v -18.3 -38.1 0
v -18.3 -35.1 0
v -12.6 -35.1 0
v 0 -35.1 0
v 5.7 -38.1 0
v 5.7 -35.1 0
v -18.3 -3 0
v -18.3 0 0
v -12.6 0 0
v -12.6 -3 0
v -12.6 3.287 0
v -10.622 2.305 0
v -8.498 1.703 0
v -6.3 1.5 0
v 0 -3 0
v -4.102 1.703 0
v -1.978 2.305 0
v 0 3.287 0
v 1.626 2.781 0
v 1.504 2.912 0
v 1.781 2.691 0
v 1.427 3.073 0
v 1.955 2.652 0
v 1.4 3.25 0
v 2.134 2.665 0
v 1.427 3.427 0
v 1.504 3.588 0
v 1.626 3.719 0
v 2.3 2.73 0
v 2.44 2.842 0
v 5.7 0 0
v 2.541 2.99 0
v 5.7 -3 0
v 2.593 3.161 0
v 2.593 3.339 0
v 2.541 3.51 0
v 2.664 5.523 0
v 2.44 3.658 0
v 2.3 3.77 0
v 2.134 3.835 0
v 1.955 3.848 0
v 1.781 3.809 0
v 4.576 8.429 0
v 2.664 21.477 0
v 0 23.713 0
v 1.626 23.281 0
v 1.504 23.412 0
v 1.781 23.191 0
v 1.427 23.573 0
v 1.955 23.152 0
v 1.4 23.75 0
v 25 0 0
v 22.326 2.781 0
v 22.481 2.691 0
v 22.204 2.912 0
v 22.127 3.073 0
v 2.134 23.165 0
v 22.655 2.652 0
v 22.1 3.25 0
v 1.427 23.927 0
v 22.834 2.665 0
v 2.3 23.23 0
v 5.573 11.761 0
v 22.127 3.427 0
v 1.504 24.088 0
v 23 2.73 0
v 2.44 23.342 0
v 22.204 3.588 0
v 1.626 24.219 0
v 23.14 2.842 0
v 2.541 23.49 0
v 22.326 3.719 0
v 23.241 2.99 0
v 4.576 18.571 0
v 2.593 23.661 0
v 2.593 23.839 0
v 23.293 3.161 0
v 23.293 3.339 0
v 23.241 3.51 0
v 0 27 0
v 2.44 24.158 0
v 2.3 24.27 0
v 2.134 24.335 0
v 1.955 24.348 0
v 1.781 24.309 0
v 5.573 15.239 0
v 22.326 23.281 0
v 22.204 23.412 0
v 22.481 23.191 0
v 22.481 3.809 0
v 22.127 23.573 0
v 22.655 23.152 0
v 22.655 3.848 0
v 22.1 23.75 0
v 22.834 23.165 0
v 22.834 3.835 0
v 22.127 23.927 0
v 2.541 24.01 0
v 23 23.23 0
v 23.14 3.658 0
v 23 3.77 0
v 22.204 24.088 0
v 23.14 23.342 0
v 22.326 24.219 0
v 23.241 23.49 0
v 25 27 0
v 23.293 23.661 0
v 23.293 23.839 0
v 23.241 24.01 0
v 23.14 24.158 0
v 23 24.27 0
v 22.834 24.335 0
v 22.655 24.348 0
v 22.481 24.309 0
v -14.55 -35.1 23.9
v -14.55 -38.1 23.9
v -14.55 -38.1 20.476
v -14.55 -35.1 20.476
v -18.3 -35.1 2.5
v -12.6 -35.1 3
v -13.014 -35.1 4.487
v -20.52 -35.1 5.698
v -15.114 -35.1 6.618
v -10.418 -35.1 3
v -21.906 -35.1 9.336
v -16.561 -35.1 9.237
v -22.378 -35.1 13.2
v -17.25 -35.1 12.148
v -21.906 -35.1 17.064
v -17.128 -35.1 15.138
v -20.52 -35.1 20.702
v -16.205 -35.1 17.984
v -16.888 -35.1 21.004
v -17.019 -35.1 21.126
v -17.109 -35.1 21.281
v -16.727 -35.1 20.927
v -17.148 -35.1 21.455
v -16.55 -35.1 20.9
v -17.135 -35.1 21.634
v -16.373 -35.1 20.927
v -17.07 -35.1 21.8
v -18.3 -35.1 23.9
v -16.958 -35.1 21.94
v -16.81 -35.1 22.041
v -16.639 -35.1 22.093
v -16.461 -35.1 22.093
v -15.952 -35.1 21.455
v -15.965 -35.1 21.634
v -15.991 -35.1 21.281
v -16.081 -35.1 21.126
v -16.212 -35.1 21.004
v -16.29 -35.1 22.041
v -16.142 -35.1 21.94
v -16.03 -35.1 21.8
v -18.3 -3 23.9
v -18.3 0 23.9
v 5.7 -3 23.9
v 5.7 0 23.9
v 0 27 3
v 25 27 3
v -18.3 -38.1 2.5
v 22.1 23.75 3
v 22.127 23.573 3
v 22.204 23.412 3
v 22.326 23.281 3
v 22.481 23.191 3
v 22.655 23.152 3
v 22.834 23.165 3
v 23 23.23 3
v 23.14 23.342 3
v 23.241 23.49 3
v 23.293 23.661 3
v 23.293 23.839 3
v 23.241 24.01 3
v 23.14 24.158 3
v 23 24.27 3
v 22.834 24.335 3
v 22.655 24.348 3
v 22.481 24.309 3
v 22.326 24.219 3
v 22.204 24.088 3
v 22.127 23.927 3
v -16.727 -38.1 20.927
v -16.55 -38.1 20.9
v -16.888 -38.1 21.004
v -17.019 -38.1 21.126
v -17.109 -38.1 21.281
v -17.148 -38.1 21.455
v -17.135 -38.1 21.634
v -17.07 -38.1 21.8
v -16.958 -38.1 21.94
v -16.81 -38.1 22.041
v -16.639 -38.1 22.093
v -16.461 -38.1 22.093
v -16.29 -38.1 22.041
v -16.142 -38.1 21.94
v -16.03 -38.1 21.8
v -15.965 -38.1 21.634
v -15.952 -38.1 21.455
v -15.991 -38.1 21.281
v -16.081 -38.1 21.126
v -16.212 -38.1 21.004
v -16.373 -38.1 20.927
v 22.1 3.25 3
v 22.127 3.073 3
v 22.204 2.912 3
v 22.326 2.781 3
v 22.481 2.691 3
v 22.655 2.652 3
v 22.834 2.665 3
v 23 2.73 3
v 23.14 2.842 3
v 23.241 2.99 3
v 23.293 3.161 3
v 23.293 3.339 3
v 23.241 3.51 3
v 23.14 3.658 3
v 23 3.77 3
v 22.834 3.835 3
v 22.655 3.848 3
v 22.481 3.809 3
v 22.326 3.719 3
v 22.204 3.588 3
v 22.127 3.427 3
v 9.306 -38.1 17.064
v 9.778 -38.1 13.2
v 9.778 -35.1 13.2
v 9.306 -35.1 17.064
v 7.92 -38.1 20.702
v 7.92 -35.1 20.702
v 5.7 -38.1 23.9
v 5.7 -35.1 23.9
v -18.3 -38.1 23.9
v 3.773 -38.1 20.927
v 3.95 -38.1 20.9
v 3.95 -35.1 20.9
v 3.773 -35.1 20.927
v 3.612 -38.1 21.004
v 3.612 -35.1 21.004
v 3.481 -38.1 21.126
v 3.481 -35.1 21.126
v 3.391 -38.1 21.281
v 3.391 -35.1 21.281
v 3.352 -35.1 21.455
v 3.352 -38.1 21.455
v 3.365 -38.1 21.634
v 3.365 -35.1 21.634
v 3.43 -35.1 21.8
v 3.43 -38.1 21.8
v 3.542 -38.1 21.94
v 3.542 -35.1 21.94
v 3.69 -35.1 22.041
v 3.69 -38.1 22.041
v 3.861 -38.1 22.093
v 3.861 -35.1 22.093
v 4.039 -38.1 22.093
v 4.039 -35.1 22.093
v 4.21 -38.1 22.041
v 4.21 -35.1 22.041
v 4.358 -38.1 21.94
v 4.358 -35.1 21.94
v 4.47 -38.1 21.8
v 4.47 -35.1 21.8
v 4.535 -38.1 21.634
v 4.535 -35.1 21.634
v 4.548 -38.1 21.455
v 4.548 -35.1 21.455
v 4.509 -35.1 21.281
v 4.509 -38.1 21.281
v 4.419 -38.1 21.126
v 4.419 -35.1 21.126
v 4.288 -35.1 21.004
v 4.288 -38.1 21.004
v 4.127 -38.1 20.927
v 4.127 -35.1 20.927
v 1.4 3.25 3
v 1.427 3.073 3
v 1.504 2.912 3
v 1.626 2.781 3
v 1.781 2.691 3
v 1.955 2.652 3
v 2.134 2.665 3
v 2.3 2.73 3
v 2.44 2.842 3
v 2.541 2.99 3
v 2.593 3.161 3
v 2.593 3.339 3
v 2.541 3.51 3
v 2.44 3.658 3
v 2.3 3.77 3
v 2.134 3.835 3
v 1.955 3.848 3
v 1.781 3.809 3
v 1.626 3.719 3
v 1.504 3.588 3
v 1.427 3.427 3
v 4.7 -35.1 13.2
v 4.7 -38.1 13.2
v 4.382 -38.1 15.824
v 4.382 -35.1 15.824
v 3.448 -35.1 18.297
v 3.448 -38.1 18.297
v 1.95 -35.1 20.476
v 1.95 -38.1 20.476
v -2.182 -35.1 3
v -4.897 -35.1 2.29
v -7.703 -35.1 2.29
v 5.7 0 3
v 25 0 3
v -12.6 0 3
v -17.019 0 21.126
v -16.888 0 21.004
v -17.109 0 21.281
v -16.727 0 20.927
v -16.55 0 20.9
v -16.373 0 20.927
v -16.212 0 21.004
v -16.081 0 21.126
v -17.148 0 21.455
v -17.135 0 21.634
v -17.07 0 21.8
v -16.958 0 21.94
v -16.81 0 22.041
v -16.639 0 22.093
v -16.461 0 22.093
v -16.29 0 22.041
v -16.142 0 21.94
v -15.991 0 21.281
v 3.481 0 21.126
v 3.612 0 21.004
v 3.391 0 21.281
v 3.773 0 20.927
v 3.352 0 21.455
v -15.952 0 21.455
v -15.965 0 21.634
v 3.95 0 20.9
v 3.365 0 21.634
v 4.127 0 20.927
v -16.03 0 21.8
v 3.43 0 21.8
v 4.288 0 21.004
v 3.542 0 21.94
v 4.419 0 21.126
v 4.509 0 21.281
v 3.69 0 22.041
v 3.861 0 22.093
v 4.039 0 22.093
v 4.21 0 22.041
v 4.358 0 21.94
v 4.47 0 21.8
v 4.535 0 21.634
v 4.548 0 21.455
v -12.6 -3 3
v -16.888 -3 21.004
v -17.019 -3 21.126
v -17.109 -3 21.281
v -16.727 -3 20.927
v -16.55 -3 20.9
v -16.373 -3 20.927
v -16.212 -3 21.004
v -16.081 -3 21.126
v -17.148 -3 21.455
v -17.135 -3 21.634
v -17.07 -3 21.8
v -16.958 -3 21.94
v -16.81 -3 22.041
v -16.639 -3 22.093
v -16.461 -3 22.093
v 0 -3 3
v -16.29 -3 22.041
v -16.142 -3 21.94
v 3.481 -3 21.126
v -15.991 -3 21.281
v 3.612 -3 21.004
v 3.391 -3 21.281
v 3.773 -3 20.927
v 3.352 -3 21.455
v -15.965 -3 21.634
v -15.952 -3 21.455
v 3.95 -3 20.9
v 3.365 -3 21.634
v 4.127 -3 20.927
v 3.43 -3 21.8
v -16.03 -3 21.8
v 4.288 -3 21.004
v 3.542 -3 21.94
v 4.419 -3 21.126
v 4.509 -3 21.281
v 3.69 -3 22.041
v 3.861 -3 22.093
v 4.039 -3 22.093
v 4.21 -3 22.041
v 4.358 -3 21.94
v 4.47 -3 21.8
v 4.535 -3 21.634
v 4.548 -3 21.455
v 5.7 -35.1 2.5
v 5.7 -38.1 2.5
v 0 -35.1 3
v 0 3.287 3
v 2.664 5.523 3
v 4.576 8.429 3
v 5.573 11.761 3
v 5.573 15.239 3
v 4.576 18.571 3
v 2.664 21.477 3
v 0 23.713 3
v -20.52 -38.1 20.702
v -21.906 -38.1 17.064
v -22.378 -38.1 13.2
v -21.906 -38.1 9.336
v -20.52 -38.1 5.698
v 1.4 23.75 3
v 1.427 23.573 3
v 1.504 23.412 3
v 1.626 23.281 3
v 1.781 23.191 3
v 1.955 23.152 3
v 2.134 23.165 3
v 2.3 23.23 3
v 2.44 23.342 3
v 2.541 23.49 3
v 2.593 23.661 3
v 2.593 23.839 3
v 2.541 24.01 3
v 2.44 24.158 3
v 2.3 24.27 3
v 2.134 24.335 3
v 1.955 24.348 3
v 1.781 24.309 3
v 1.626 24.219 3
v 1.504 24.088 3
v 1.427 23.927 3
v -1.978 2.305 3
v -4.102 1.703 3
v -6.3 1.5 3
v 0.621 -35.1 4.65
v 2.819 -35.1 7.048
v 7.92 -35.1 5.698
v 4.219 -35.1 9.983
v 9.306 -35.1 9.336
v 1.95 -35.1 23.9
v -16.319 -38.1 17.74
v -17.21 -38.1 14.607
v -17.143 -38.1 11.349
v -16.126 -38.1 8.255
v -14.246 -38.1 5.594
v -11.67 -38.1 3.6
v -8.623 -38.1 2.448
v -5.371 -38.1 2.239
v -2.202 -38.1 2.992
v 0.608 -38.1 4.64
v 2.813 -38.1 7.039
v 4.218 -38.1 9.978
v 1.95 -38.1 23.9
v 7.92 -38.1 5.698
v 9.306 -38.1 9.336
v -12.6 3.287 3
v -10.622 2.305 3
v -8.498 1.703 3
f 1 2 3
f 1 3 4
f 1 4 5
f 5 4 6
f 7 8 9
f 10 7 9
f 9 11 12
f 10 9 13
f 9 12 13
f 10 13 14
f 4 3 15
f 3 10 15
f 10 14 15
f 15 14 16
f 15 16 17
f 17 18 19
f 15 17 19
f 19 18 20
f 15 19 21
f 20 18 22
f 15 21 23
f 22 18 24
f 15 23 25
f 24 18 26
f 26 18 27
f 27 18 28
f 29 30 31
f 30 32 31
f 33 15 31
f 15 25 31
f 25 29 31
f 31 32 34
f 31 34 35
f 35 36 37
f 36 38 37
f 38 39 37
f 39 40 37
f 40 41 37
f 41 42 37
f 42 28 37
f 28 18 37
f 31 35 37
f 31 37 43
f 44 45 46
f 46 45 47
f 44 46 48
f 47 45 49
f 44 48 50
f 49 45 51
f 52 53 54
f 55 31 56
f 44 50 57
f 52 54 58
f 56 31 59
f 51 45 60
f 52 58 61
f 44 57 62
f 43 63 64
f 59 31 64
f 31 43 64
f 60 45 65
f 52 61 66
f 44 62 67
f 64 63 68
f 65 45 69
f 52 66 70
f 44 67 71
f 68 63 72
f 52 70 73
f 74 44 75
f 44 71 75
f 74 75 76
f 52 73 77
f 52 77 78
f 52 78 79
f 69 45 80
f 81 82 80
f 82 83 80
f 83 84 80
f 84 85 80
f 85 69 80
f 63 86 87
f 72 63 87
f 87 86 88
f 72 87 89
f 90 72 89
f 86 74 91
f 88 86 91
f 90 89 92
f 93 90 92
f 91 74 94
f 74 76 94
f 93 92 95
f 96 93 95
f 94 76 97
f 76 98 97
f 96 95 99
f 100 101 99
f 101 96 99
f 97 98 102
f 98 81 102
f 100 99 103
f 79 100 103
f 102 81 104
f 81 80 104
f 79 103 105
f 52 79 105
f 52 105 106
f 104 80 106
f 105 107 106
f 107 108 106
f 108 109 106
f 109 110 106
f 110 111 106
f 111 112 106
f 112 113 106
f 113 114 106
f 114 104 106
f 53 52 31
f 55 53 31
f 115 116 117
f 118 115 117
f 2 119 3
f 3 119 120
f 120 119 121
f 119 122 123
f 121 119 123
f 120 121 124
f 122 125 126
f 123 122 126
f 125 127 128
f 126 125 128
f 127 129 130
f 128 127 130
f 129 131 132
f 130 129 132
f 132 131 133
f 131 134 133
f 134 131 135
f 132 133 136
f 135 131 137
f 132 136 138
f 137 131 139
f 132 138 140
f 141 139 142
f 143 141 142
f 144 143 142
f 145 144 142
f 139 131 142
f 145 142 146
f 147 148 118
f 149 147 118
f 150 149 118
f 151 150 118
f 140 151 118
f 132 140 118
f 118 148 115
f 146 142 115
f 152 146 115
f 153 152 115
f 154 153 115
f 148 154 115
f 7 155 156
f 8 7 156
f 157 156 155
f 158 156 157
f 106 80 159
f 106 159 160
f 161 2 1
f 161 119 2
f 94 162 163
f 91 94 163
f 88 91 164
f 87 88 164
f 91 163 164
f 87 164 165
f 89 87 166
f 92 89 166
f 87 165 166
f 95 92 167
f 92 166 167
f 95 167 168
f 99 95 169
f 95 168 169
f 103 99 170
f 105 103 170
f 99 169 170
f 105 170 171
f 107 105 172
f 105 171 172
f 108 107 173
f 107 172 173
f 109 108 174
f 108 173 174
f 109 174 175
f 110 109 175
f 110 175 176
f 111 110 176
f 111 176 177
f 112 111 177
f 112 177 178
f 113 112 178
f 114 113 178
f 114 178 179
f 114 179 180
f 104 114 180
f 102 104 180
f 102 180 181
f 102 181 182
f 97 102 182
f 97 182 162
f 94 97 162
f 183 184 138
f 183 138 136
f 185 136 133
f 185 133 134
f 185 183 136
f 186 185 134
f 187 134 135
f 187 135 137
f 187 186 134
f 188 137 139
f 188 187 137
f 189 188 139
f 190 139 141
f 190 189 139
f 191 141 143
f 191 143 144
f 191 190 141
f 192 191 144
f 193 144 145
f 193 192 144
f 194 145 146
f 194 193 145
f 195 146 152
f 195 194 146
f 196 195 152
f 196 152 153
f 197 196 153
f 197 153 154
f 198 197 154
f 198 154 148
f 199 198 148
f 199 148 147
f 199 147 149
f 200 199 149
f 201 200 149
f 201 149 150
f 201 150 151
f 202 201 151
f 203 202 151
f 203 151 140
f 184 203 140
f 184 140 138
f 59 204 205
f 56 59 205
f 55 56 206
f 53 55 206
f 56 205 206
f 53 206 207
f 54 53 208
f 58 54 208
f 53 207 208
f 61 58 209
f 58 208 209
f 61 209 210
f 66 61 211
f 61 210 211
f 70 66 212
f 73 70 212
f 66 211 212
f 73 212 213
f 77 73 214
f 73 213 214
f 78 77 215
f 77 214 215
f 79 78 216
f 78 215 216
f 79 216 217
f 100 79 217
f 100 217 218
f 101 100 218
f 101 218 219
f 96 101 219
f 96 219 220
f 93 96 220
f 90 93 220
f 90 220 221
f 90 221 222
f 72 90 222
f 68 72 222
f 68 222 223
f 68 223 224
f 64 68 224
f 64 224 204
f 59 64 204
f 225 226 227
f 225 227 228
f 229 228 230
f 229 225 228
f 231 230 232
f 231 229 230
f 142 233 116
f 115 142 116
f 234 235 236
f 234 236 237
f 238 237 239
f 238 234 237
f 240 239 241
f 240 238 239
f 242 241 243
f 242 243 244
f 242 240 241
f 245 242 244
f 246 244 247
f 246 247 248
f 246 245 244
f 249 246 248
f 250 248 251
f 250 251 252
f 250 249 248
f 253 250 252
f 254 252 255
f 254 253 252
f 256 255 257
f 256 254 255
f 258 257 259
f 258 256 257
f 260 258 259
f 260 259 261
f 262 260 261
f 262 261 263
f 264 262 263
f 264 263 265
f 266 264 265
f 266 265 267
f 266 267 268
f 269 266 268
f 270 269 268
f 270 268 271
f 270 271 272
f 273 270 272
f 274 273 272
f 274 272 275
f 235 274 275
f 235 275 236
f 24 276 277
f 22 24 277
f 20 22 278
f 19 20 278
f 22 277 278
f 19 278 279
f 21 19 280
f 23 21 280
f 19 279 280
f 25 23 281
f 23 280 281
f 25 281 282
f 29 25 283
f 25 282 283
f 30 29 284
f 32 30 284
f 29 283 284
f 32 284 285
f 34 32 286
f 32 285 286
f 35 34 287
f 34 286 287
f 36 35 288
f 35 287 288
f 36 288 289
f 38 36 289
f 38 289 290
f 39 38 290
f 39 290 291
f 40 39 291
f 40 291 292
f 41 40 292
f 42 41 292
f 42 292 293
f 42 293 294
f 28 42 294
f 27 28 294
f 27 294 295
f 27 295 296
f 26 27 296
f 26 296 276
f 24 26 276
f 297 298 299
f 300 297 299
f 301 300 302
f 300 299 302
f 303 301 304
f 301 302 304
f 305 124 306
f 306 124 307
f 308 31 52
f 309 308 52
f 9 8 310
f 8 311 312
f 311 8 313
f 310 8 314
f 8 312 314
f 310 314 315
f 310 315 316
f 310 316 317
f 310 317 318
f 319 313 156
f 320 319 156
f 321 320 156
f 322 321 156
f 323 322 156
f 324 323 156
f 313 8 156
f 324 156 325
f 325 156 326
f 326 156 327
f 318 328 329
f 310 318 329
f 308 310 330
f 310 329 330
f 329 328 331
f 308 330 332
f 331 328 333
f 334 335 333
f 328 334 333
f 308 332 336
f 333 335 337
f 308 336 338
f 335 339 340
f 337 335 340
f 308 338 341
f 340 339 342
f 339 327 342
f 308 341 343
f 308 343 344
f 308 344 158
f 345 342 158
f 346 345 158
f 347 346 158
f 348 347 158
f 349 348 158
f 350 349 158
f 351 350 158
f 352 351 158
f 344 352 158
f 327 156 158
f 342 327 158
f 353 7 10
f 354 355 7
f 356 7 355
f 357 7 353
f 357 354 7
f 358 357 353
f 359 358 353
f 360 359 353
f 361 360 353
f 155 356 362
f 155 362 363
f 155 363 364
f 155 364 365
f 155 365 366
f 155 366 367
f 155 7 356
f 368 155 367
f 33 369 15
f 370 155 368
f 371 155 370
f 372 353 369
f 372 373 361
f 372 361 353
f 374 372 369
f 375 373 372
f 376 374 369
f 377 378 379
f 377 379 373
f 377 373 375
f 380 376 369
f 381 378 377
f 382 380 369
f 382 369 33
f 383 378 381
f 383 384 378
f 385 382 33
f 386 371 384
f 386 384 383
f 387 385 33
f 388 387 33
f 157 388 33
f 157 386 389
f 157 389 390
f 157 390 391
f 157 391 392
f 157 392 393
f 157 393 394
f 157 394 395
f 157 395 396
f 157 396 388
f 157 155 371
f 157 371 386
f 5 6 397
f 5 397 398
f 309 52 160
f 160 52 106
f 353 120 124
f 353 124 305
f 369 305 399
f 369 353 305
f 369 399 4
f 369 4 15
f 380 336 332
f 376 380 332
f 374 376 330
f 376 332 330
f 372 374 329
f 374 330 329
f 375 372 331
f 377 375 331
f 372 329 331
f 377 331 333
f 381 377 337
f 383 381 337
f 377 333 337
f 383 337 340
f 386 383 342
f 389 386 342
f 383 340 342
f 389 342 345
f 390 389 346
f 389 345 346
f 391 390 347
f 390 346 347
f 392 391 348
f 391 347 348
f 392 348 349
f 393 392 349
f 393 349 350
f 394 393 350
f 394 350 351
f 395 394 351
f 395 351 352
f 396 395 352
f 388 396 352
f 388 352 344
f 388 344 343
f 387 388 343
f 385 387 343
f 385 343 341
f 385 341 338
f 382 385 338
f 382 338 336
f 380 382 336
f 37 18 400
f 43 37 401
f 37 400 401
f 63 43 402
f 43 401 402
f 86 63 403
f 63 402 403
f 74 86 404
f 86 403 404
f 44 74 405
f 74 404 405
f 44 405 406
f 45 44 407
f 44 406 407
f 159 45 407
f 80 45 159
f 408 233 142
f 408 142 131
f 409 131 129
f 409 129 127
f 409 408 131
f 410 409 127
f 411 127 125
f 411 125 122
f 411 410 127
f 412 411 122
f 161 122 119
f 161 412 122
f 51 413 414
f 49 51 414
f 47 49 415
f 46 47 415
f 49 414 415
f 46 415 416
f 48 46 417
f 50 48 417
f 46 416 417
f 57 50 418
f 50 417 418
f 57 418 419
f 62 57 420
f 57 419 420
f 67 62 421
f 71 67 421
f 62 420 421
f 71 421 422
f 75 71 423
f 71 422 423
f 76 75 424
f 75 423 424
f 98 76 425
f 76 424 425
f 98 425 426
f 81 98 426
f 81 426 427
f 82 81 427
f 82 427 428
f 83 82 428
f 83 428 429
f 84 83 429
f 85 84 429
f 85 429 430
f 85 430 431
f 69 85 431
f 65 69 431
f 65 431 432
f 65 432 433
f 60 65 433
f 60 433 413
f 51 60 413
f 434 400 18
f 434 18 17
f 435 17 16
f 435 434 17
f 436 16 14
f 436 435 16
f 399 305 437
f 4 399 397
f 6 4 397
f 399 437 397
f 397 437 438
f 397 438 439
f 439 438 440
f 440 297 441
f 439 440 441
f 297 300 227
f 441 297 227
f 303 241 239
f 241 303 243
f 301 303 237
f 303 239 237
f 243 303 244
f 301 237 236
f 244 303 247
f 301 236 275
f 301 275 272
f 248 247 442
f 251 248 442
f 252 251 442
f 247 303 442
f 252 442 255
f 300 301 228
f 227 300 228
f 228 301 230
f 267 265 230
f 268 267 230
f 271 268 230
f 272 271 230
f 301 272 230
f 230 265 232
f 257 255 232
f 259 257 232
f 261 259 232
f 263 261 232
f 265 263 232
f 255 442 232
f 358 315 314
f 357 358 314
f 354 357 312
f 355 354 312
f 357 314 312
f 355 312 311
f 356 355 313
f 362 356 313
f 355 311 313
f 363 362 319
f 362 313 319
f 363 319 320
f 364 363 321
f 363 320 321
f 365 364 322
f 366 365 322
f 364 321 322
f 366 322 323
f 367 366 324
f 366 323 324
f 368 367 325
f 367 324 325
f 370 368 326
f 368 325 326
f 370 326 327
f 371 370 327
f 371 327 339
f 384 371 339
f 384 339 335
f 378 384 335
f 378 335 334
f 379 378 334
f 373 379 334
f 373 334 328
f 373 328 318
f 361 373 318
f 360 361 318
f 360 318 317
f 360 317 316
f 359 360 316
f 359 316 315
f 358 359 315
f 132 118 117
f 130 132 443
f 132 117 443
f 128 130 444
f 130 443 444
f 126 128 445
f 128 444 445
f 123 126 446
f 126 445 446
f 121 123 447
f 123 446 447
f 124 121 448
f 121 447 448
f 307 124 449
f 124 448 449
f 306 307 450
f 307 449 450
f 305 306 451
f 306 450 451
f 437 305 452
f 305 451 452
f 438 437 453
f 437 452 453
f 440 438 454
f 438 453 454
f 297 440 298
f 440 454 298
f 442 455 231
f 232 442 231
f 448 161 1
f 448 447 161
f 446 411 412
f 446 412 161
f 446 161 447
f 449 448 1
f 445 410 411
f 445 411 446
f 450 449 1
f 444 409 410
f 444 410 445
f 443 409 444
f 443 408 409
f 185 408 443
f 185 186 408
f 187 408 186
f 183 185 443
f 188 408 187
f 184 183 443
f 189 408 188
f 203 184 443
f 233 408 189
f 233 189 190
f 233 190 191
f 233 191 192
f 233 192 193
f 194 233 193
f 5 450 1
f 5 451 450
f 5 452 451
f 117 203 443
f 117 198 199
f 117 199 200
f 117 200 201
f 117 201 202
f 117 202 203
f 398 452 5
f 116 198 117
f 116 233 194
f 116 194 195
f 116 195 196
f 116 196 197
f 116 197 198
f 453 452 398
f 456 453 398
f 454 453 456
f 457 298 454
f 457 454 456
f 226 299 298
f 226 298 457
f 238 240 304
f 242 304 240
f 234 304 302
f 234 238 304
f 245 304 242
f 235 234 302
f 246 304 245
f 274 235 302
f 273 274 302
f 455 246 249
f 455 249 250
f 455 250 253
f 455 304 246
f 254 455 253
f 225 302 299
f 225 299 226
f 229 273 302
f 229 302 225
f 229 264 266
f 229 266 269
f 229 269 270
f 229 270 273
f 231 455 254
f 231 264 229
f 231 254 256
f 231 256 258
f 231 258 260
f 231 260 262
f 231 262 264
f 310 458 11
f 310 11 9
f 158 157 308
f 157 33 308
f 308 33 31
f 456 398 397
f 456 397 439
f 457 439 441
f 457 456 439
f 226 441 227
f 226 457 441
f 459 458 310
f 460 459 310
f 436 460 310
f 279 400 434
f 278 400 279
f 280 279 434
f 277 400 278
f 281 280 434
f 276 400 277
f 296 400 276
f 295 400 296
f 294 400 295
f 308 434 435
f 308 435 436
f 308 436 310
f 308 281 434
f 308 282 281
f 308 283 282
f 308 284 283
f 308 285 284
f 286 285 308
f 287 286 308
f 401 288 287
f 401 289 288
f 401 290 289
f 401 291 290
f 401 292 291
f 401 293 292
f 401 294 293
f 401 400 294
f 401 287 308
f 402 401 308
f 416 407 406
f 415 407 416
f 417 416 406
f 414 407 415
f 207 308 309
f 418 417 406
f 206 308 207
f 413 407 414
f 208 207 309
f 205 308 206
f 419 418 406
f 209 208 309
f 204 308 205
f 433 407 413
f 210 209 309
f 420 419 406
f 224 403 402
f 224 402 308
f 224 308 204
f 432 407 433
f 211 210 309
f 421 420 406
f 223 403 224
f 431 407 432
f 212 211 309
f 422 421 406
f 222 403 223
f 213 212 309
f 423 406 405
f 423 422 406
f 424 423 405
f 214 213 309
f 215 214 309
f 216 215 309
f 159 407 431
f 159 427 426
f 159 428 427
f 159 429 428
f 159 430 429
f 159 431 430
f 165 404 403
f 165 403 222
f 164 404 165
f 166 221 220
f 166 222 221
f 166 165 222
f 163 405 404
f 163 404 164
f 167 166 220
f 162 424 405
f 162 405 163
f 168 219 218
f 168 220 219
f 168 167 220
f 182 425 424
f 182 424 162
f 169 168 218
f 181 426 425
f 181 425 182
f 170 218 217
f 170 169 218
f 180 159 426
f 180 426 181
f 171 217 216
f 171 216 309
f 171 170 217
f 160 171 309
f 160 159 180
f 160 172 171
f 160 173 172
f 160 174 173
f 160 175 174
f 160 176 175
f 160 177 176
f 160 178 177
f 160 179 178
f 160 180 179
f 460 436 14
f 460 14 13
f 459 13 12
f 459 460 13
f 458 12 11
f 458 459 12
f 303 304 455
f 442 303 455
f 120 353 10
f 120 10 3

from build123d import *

# Parameters (mm, degrees)
SKETCH_1_W                      = 25
SKETCH_1_H                      = 27
EXTRUDE_1_DEPTH                 = 3
CUT_EXTRUDE_1_REACH             = 38.919
SKETCH_2_R                      = 0.6
SKETCH_2_R_2                    = 12
CUT_EXTRUDE_1_DIRECTION_2_DEPTH = 37.918829884
EXTRUDE_2_DEPTH                 = 3
SKETCH_4_W                      = 24
SKETCH_4_H                      = 3
EXTRUDE_3_DEPTH                 = 20.9
EXTRUDE_3_DIRECTION_2_REACH     = 47.668
CUT_EXTRUDE_2_REACH             = 53.457
SKETCH_5_R                      = 0.6
CUT_EXTRUDE_2_DIRECTION_2_DEPTH = 52.456972317
CUT_EXTRUDE_4_DEPTH             = 3
EXTRUDE_4_DEPTH                 = 3


with BuildPart() as part:
    # 草图1 → 凸台-拉伸1 (new body)
    with BuildSketch(Plane.XY):
        with Locations((12.5, 13.5)):
            Rectangle(SKETCH_1_W, SKETCH_1_H)
    extrude(amount=EXTRUDE_1_DEPTH)

    # 草图2 → 切除-拉伸1 (cut, up to next)
    with BuildSketch(Plane.XY.offset(3), mode=Mode.PRIVATE) as cut_extrude_1_sk1:
        with Locations(Location((2, 23.75, 0), (0, 0, 180))):
            Circle(SKETCH_2_R)
    cut_extrude_1_tool1 = extrude(cut_extrude_1_sk1.sketch, amount=-CUT_EXTRUDE_1_REACH, mode=Mode.PRIVATE) & part.part
    # 草图2 → 切除-拉伸1 (cut, up to next)
    with BuildSketch(Plane.XY.offset(3), mode=Mode.PRIVATE) as cut_extrude_1_sk2:
        with Locations(Location((22.7, 23.75, 0), (0, 0, 180))):
            Circle(SKETCH_2_R)
    cut_extrude_1_tool2 = extrude(cut_extrude_1_sk2.sketch, amount=-CUT_EXTRUDE_1_REACH, mode=Mode.PRIVATE) & part.part
    # 草图2 → 切除-拉伸1 (cut, up to next)
    with BuildSketch(Plane.XY.offset(3), mode=Mode.PRIVATE) as cut_extrude_1_sk3:
        with Locations(Location((22.7, 3.25, 0), (0, 0, 180))):
            Circle(SKETCH_2_R)
    cut_extrude_1_tool3 = extrude(cut_extrude_1_sk3.sketch, amount=-CUT_EXTRUDE_1_REACH, mode=Mode.PRIVATE) & part.part
    # 草图2 → 切除-拉伸1 (cut, up to next)
    with BuildSketch(Plane.XY.offset(3), mode=Mode.PRIVATE) as cut_extrude_1_sk4:
        with Locations(Location((2, 3.25, 0), (0, 0, 180))):
            Circle(SKETCH_2_R)
    cut_extrude_1_tool4 = extrude(cut_extrude_1_sk4.sketch, amount=-CUT_EXTRUDE_1_REACH, mode=Mode.PRIVATE) & part.part
    # 草图2 → 切除-拉伸1 (cut, up to next)
    with BuildSketch(Plane.XY.offset(3), mode=Mode.PRIVATE) as cut_extrude_1_sk5:
        with Locations((-6.3, 13.5)):
            Circle(SKETCH_2_R_2)
    cut_extrude_1_tool5 = extrude(cut_extrude_1_sk5.sketch, amount=-CUT_EXTRUDE_1_REACH, mode=Mode.PRIVATE) & part.part
    add(cut_extrude_1_tool1.solids().sort_by_distance((2, 23.75, 3))[0], mode=Mode.SUBTRACT)
    add(cut_extrude_1_tool2.solids().sort_by_distance((22.7, 23.75, 3))[0], mode=Mode.SUBTRACT)
    add(cut_extrude_1_tool3.solids().sort_by_distance((22.7, 3.25, 3))[0], mode=Mode.SUBTRACT)
    add(cut_extrude_1_tool4.solids().sort_by_distance((2, 3.25, 3))[0], mode=Mode.SUBTRACT)
    add(cut_extrude_1_tool5.solids().sort_by_distance((-6.3, 13.5, 3))[0], mode=Mode.SUBTRACT)

    # 草图2 → 切除-拉伸1 direction 2 (cut)
    with BuildSketch(Plane.XY.offset(3)):
        with Locations(Location((2, 23.75, 0), (0, 0, 180))):
            Circle(SKETCH_2_R)
        with Locations(Location((22.7, 23.75, 0), (0, 0, 180))):
            Circle(SKETCH_2_R)
        with Locations(Location((22.7, 3.25, 0), (0, 0, 180))):
            Circle(SKETCH_2_R)
        with Locations(Location((2, 3.25, 0), (0, 0, 180))):
            Circle(SKETCH_2_R)
        with Locations((-6.3, 13.5)):
            Circle(SKETCH_2_R_2)
    extrude(amount=CUT_EXTRUDE_1_DIRECTION_2_DEPTH, mode=Mode.SUBTRACT)

    # 草图3 → 凸台-拉伸2 (add)
    with BuildSketch(Plane.XY.offset(3)):
        with BuildLine():
            ThreePointArc((0, 3.286773282), (-3.025761204, 1.955331953), (-6.3, 1.5))
            Line((-6.3, 1.5), (-6.3, -38.1))
            Line((-6.3, -38.1), (0, -38.1))
            Line((0, -38.1), (0, 0))
            Line((0, 0), (0, 3.286773282))
        make_face()
        with BuildLine():
            Line((-6.3, -38.1), (-6.3, 1.5))
            ThreePointArc((-6.3, 1.5), (-9.574238796, 1.955331953), (-12.6, 3.286773282))
            Line((-12.6, 3.286773282), (-12.6, -38.1))
            Line((-12.6, -38.1), (-6.3, -38.1))
        make_face()
    extrude(amount=-EXTRUDE_2_DEPTH)

    # 草图4 → 凸台-拉伸3 (add)
    with BuildSketch(Plane.XY.offset(3)):
        with Locations((-6.3, -1.5)):
            Rectangle(SKETCH_4_W, SKETCH_4_H)
    extrude_3 = extrude(amount=EXTRUDE_3_DEPTH)

    # 凸台-拉伸3 direction 2: up to this face of the body (flat: up to its plane)
    extrude_3_direction_2_end = Plane(part.part.faces().sort_by_distance((6.451782548, 13.5, 0))[0])
    # 草图4 → 凸台-拉伸3 direction 2 (add, up to the picked face)
    with BuildSketch(Plane.XY.offset(3), mode=Mode.PRIVATE) as extrude_3_direction_2_sk1:
        with Locations((-6.3, -1.5)):
            Rectangle(SKETCH_4_W, SKETCH_4_H)
    extrude_3_direction_2_tool1 = split(extrude(extrude_3_direction_2_sk1.sketch, amount=-EXTRUDE_3_DIRECTION_2_REACH, mode=Mode.PRIVATE), bisect_by=extrude_3_direction_2_end, keep=Keep.BOTH, mode=Mode.PRIVATE)
    extrude_3_direction_2 = extrude_3_direction_2_tool1.solids().sort_by(Axis((-6.3, -1.5, 3), (0, 0, -1)))[0]
    add(extrude_3_direction_2)

    # 草图5 → 切除-拉伸2 (cut, up to next)
    with BuildSketch(Plane(origin=(0, 0, 0), x_dir=(1, 0, 0), z_dir=(0, 1, 0)), mode=Mode.PRIVATE) as cut_extrude_2_sk1:
        with Locations(Location((-16.55, -21.5, 0), (0, 0, 90))):
            Circle(SKETCH_5_R)
    cut_extrude_2_tool1 = extrude(cut_extrude_2_sk1.sketch, amount=-CUT_EXTRUDE_2_REACH, mode=Mode.PRIVATE) & part.part
    # 草图5 → 切除-拉伸2 (cut, up to next)
    with BuildSketch(Plane(origin=(0, 0, 0), x_dir=(1, 0, 0), z_dir=(0, 1, 0)), mode=Mode.PRIVATE) as cut_extrude_2_sk2:
        with Locations(Location((3.95, -21.5, 0), (0, 0, 90))):
            Circle(SKETCH_5_R)
    cut_extrude_2_tool2 = extrude(cut_extrude_2_sk2.sketch, amount=-CUT_EXTRUDE_2_REACH, mode=Mode.PRIVATE) & part.part
    cut_extrude_2_1 = cut_extrude_2_tool1.solids().sort_by_distance((-16.55, 0, 21.5))[0]
    add(cut_extrude_2_1, mode=Mode.SUBTRACT)
    cut_extrude_2_2 = cut_extrude_2_tool2.solids().sort_by_distance((3.95, 0, 21.5))[0]
    add(cut_extrude_2_2, mode=Mode.SUBTRACT)
    cut_extrude_2 = cut_extrude_2_1 + cut_extrude_2_2  # 切除-拉伸2 as one shape, for the pattern or mirror that repeats it

    # 草图5 → 切除-拉伸2 direction 2 (cut)
    with BuildSketch(Plane(origin=(0, 0, 0), x_dir=(1, 0, 0), z_dir=(0, 1, 0))):
        with Locations(Location((-16.55, -21.5, 0), (0, 0, 90))):
            Circle(SKETCH_5_R)
        with Locations(Location((3.95, -21.5, 0), (0, 0, 90))):
            Circle(SKETCH_5_R)
    cut_extrude_2_direction_2 = extrude(amount=CUT_EXTRUDE_2_DIRECTION_2_DEPTH, mode=Mode.SUBTRACT)

    # 镜向3: 凸台-拉伸3, 凸台-拉伸3 direction 2, 切除-拉伸2, 切除-拉伸2 direction 2 across plane
    add(extrude_3.mirror(Plane(origin=(0, -19.05, 0), x_dir=(0, 0, 1), z_dir=(0, -1, 0))))
    add(extrude_3_direction_2.mirror(Plane(origin=(0, -19.05, 0), x_dir=(0, 0, 1), z_dir=(0, -1, 0))))
    add(cut_extrude_2.mirror(Plane(origin=(0, -19.05, 0), x_dir=(0, 0, 1), z_dir=(0, -1, 0))), mode=Mode.SUBTRACT)
    add(cut_extrude_2_direction_2.mirror(Plane(origin=(0, -19.05, 0), x_dir=(0, 0, 1), z_dir=(0, -1, 0))), mode=Mode.SUBTRACT)

    # 草图9 → 切除-拉伸4 (cut)
    with BuildSketch(Plane.XZ.offset(38.1)):
        with BuildLine():
            ThreePointArc((-8.851470164, 23.9), (-11.965615436, 22.628722169), (-14.55, 20.475816105))
            ThreePointArc((-14.55, 20.475816105), (-10.189087297, 2.910442186), (4.7, 13.2))
            ThreePointArc((4.7, 13.2), (3.989557814, 17.089087297), (1.95, 20.475816105))
            ThreePointArc((1.95, 20.475816105), (-0.634384564, 22.628722169), (-3.748529836, 23.9))
            Line((-3.748529836, 23.9), (-8.851470164, 23.9))
        make_face()
        with BuildLine():
            ThreePointArc((-3.748529836, 23.9), (-6.3, 24.2), (-8.851470164, 23.9))
            Line((-8.851470164, 23.9), (-3.748529836, 23.9))
        make_face()
        with BuildLine():
            Line((-8.851470164, 23.9), (-14.55, 23.9))
            Line((-14.55, 23.9), (-14.55, 20.475816105))
            ThreePointArc((-14.55, 20.475816105), (-11.965615436, 22.628722169), (-8.851470164, 23.9))
        make_face()
        with BuildLine():
            Line((1.95, 23.9), (-3.748529836, 23.9))
            ThreePointArc((-3.748529836, 23.9), (-0.634384564, 22.628722169), (1.95, 20.475816105))
            Line((1.95, 20.475816105), (1.95, 23.9))
        make_face()
    extrude(amount=-CUT_EXTRUDE_4_DEPTH, mode=Mode.SUBTRACT)

    # 草图10 → 凸台-拉伸4 (add)
    with BuildSketch(Plane.XZ.offset(38.1)):
        with BuildLine():
            ThreePointArc((-18.3, 23.9), (-22.377624203, 13.2), (-18.3, 2.5))
            Line((-18.3, 2.5), (-18.3, 23.9))
        make_face()
        with BuildLine():
            Line((5.7, 23.9), (5.7, 2.5))
            ThreePointArc((5.7, 2.5), (8.723672827, 7.474682997), (9.777624203, 13.2))
            ThreePointArc((9.777624203, 13.2), (8.723672827, 18.925317003), (5.7, 23.9))
        make_face()
    extrude(amount=-EXTRUDE_4_DEPTH)


solid = part.part
